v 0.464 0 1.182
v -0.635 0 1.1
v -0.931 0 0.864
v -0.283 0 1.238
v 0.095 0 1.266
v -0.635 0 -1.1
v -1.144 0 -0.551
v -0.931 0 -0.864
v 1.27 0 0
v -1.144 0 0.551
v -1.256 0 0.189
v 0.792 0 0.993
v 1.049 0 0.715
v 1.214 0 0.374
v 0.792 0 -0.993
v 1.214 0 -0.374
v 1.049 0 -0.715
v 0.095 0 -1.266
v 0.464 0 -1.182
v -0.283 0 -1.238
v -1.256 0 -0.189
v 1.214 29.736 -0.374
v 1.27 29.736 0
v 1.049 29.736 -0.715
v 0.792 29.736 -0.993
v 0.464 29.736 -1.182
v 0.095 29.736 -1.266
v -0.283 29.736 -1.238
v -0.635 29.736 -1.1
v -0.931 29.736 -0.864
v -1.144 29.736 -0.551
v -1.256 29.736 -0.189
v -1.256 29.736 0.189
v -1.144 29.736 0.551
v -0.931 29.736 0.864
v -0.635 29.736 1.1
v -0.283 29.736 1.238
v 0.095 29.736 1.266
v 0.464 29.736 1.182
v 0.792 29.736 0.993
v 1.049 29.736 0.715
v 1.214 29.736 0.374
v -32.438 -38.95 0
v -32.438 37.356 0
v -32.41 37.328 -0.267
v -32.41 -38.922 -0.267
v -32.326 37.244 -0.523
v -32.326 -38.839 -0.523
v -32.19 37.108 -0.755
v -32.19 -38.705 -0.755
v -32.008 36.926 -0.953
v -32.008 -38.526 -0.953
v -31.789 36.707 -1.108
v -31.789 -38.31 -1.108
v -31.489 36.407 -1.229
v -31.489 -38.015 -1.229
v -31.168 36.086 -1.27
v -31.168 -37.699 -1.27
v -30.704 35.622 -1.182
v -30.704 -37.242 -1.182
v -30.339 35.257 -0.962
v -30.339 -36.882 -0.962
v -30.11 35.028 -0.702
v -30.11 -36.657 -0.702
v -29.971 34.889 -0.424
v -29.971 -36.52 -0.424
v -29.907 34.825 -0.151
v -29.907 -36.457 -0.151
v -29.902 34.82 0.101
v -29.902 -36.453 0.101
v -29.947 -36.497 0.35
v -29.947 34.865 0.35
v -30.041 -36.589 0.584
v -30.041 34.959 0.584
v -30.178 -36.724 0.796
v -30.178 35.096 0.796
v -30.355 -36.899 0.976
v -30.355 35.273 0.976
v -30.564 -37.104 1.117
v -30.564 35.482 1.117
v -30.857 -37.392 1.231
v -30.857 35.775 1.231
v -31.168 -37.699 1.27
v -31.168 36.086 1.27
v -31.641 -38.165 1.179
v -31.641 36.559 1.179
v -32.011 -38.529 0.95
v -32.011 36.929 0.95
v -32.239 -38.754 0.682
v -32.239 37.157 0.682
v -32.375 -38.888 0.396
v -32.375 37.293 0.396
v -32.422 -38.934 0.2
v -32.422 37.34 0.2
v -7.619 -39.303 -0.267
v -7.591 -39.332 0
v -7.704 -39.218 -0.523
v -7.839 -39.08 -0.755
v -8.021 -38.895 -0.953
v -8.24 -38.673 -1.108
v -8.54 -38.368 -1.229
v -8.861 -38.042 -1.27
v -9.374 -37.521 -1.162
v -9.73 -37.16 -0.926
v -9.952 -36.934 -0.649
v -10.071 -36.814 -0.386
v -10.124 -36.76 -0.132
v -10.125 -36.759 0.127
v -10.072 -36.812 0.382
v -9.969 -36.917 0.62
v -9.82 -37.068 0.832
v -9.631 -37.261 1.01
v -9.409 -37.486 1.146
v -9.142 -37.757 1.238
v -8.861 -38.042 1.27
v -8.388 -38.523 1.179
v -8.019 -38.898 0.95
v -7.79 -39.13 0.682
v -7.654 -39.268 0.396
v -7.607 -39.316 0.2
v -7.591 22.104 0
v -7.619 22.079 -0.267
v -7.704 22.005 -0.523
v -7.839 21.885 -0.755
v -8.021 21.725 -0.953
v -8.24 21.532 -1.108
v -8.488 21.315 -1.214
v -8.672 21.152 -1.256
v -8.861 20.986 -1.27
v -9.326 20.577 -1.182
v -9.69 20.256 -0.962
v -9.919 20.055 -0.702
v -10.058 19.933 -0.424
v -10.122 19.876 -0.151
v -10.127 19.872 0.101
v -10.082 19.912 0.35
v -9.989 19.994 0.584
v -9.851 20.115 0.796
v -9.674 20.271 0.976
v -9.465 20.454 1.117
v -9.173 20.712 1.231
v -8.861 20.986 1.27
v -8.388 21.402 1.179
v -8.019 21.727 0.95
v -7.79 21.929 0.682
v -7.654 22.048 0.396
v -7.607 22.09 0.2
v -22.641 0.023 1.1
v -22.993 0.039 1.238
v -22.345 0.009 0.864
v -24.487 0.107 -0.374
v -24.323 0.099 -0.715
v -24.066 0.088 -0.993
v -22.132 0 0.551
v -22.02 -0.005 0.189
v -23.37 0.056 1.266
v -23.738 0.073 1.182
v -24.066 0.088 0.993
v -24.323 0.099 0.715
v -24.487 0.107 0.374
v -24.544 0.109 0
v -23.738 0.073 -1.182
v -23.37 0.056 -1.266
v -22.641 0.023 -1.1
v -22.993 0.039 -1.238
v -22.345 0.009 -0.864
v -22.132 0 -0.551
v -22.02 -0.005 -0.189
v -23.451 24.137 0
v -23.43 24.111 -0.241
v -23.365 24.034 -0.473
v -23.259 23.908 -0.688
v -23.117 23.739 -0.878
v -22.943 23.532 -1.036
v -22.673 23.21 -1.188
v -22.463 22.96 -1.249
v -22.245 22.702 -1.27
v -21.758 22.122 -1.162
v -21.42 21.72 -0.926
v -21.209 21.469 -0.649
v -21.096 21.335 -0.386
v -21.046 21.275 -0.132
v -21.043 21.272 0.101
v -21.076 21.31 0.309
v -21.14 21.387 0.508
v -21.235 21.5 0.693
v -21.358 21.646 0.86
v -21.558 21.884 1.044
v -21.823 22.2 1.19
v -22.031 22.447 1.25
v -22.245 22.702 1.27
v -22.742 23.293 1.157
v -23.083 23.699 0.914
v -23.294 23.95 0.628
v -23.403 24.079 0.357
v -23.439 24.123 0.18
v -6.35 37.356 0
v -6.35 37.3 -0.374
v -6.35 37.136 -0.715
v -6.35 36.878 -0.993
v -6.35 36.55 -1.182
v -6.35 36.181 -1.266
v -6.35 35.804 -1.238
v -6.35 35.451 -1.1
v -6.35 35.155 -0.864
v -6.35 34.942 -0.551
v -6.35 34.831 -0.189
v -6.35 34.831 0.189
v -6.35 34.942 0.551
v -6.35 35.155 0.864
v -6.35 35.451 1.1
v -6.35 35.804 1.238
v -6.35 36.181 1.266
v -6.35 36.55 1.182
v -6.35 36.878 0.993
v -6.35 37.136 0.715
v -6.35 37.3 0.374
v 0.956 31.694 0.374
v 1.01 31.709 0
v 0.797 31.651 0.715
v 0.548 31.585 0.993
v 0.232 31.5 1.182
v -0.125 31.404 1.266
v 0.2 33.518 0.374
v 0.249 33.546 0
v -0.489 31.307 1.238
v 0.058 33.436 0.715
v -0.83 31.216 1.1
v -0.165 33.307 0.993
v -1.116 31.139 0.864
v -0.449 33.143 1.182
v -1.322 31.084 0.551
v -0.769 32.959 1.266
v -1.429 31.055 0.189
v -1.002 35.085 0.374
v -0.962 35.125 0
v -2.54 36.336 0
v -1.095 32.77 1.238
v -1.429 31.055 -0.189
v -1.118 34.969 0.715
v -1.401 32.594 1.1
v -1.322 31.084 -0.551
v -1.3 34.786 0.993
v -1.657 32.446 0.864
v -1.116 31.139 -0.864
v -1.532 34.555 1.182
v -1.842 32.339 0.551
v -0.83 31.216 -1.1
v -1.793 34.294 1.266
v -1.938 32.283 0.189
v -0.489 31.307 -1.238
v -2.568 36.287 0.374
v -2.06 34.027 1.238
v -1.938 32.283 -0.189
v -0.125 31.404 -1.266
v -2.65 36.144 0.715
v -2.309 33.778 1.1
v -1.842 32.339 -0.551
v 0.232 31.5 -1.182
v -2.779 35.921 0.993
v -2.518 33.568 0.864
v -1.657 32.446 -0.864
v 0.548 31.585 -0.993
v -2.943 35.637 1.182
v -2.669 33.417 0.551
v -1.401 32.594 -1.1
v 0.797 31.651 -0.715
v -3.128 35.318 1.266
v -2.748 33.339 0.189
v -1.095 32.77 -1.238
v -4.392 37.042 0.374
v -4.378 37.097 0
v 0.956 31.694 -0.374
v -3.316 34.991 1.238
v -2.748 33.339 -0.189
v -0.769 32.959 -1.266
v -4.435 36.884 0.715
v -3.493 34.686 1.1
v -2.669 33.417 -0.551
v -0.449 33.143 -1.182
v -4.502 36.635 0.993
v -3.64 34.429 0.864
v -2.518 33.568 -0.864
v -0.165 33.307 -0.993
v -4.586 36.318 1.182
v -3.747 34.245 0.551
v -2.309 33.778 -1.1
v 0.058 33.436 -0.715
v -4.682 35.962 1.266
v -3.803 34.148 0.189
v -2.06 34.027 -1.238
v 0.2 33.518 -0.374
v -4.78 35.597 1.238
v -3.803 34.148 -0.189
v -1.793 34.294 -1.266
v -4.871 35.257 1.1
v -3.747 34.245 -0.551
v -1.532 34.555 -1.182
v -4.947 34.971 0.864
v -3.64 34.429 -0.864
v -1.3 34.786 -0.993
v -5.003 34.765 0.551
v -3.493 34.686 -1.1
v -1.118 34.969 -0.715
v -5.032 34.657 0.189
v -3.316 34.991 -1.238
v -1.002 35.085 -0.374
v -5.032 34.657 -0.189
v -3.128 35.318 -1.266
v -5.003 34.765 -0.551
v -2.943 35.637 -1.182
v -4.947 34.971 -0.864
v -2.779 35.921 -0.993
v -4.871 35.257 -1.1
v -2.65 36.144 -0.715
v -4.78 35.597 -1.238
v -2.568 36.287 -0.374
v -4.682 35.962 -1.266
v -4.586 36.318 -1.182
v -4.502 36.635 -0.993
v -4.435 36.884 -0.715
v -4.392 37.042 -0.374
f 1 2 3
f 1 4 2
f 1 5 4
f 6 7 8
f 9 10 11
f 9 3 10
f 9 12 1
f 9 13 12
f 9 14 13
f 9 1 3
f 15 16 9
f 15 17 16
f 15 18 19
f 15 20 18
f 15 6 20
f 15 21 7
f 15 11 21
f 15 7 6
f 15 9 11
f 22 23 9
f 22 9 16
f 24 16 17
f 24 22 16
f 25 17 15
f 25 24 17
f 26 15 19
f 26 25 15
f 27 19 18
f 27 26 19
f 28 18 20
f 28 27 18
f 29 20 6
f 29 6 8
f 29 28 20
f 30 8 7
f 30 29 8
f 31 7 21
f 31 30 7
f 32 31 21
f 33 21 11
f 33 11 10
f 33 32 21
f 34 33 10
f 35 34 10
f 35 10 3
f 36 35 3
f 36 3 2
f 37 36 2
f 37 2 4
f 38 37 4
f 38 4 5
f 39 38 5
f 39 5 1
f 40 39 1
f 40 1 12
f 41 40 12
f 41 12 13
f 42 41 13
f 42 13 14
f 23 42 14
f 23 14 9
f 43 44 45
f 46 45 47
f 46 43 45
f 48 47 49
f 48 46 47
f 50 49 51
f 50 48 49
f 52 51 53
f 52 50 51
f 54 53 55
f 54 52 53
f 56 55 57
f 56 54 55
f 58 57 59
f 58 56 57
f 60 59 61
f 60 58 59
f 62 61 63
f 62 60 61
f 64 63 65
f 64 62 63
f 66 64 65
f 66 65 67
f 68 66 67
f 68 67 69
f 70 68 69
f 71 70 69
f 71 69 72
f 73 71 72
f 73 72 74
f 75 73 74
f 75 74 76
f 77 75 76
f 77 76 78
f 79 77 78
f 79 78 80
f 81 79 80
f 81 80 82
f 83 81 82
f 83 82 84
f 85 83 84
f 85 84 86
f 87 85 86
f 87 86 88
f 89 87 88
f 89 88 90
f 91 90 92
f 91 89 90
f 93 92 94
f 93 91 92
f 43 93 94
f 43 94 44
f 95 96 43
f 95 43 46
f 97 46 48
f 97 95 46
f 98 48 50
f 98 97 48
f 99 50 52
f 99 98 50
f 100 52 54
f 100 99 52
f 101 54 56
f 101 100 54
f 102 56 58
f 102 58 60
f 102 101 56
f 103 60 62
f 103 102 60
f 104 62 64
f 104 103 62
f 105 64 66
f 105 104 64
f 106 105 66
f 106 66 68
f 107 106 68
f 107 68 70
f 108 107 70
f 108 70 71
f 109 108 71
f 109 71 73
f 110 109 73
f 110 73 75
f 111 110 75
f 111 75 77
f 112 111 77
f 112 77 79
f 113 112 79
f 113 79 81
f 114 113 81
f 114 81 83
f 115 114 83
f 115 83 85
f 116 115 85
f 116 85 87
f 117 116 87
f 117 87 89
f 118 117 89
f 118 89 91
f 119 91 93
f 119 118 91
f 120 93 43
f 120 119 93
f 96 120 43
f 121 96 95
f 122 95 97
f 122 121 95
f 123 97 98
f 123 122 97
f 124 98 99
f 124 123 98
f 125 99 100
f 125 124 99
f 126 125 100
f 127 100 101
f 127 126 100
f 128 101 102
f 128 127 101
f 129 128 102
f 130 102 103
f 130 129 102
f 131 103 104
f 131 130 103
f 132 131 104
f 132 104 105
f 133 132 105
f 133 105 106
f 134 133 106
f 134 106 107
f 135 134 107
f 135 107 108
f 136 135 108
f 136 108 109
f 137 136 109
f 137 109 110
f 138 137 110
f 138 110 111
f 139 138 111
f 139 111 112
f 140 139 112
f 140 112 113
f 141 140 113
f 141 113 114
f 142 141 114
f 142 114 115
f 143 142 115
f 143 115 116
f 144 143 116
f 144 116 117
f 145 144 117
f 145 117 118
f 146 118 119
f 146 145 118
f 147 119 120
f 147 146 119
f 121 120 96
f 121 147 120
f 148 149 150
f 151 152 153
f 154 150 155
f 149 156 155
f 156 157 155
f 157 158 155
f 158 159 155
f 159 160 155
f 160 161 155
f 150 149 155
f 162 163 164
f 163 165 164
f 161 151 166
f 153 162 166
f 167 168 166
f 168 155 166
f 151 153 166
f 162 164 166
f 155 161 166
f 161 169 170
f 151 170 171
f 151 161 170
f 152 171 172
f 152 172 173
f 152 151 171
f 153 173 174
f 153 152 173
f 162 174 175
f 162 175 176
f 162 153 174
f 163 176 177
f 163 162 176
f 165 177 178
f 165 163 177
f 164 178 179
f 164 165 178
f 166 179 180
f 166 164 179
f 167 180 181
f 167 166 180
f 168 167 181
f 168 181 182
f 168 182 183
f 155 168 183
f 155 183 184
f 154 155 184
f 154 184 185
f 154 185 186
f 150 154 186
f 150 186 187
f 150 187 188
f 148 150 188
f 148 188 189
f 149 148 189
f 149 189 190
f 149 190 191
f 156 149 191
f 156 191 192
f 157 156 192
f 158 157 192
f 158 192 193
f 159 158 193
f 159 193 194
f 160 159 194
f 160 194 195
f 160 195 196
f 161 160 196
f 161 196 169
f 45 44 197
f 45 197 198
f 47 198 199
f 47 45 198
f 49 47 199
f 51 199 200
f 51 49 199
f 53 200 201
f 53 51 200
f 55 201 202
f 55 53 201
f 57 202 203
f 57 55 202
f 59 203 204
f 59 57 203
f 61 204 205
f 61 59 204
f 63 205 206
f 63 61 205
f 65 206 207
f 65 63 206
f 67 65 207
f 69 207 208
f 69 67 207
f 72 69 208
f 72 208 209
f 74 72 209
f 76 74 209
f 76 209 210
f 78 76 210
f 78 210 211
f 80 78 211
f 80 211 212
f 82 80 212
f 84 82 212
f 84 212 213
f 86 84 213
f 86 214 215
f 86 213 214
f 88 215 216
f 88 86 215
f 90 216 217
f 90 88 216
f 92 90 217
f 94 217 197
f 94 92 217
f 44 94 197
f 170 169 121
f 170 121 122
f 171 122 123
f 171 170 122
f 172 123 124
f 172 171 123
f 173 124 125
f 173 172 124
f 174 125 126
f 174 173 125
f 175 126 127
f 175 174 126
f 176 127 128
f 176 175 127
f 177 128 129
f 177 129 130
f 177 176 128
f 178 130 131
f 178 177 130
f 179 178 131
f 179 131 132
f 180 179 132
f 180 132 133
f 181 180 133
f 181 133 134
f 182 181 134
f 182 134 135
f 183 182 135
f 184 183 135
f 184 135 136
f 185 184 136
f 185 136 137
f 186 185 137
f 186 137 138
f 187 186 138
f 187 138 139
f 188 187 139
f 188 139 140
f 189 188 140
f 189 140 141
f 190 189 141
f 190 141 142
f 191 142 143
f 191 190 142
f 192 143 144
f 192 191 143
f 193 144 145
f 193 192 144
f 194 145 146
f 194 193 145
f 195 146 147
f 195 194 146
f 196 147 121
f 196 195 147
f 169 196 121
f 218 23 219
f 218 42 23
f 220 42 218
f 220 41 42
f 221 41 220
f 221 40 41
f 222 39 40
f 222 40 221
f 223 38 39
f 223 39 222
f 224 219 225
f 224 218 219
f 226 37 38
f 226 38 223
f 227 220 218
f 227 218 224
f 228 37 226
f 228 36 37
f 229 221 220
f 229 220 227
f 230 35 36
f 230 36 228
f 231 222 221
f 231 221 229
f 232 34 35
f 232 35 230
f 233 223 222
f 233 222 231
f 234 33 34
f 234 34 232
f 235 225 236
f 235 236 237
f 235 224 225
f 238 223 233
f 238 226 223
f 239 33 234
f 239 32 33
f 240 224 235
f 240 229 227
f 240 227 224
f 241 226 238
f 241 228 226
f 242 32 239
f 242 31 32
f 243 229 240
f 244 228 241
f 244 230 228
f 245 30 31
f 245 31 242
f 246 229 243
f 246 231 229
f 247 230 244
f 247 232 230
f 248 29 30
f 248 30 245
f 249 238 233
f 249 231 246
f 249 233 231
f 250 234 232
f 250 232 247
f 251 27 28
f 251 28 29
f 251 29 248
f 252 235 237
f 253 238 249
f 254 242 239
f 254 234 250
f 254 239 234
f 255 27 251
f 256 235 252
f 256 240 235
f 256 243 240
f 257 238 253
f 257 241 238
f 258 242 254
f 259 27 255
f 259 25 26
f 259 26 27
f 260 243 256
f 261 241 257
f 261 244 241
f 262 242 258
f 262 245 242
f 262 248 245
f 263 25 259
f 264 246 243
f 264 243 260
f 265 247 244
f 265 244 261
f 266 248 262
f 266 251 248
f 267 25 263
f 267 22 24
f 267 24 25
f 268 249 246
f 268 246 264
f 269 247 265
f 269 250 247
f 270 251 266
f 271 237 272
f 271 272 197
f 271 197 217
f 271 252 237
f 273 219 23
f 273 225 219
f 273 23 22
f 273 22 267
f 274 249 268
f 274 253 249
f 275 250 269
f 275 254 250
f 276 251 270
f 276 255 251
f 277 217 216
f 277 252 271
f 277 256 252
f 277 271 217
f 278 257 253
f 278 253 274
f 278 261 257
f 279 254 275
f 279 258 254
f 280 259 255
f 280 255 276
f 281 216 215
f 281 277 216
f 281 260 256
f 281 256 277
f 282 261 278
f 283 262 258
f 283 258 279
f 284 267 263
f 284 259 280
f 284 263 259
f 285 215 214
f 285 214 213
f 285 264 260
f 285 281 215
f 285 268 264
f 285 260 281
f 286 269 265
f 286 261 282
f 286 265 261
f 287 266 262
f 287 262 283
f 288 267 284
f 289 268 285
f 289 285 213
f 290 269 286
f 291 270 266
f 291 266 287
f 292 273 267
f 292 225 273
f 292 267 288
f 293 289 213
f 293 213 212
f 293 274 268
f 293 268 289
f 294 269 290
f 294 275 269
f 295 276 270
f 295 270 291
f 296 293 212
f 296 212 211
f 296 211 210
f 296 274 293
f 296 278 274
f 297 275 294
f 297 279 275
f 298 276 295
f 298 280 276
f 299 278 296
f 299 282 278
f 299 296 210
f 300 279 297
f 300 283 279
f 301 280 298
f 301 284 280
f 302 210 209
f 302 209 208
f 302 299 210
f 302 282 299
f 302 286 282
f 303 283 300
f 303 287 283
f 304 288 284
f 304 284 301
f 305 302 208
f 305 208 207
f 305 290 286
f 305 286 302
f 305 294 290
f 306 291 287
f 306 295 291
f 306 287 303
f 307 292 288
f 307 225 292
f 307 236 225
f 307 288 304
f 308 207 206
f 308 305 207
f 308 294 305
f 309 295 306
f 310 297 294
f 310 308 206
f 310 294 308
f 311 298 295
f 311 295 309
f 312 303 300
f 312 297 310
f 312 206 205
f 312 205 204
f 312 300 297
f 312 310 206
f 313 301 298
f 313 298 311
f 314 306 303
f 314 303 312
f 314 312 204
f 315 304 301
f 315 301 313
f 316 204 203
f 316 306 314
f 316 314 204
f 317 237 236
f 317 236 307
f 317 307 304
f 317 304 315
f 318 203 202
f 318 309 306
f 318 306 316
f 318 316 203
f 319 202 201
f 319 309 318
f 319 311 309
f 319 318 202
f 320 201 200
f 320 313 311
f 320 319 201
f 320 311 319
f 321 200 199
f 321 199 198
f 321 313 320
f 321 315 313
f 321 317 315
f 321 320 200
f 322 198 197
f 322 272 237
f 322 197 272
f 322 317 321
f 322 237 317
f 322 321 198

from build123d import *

# Parameters (mm, degrees)
F0_R = 1.27


with BuildPart() as f2:
    # F2: sweep along a path in F1
    with BuildLine(Plane.XY) as f2_path:
        Line((0, 0), (0, 29.7363953829))
        ThreePointArc((0, 29.7363953829), (-1.8598719395, 34.2265234434), (-6.35, 36.0863953829))
        Line((-6.35, 36.0863953829), (-31.1682708561, 36.0863953829))
        Line((-31.1682708561, 36.0863953829), (-31.1682708561, -37.6992039382))
        Line((-31.1682708561, -37.6992039382), (-8.8609969243, -38.042396307))
        Line((-8.8609969243, -38.042396307), (-8.8609969243, 20.9860876203))
        Line((-8.8609969243, 20.9860876203), (-22.2453605384, 22.7020308375))
        Line((-22.2453605384, 22.7020308375), (-23.2749264687, 0.0515673637))
    # F0 (on Front) → F2 (sweep)
    with BuildSketch(Plane.XZ):
        Circle(F0_R)
    sweep(path=f2_path.line, transition=Transition.RIGHT)


solid = f2.part
